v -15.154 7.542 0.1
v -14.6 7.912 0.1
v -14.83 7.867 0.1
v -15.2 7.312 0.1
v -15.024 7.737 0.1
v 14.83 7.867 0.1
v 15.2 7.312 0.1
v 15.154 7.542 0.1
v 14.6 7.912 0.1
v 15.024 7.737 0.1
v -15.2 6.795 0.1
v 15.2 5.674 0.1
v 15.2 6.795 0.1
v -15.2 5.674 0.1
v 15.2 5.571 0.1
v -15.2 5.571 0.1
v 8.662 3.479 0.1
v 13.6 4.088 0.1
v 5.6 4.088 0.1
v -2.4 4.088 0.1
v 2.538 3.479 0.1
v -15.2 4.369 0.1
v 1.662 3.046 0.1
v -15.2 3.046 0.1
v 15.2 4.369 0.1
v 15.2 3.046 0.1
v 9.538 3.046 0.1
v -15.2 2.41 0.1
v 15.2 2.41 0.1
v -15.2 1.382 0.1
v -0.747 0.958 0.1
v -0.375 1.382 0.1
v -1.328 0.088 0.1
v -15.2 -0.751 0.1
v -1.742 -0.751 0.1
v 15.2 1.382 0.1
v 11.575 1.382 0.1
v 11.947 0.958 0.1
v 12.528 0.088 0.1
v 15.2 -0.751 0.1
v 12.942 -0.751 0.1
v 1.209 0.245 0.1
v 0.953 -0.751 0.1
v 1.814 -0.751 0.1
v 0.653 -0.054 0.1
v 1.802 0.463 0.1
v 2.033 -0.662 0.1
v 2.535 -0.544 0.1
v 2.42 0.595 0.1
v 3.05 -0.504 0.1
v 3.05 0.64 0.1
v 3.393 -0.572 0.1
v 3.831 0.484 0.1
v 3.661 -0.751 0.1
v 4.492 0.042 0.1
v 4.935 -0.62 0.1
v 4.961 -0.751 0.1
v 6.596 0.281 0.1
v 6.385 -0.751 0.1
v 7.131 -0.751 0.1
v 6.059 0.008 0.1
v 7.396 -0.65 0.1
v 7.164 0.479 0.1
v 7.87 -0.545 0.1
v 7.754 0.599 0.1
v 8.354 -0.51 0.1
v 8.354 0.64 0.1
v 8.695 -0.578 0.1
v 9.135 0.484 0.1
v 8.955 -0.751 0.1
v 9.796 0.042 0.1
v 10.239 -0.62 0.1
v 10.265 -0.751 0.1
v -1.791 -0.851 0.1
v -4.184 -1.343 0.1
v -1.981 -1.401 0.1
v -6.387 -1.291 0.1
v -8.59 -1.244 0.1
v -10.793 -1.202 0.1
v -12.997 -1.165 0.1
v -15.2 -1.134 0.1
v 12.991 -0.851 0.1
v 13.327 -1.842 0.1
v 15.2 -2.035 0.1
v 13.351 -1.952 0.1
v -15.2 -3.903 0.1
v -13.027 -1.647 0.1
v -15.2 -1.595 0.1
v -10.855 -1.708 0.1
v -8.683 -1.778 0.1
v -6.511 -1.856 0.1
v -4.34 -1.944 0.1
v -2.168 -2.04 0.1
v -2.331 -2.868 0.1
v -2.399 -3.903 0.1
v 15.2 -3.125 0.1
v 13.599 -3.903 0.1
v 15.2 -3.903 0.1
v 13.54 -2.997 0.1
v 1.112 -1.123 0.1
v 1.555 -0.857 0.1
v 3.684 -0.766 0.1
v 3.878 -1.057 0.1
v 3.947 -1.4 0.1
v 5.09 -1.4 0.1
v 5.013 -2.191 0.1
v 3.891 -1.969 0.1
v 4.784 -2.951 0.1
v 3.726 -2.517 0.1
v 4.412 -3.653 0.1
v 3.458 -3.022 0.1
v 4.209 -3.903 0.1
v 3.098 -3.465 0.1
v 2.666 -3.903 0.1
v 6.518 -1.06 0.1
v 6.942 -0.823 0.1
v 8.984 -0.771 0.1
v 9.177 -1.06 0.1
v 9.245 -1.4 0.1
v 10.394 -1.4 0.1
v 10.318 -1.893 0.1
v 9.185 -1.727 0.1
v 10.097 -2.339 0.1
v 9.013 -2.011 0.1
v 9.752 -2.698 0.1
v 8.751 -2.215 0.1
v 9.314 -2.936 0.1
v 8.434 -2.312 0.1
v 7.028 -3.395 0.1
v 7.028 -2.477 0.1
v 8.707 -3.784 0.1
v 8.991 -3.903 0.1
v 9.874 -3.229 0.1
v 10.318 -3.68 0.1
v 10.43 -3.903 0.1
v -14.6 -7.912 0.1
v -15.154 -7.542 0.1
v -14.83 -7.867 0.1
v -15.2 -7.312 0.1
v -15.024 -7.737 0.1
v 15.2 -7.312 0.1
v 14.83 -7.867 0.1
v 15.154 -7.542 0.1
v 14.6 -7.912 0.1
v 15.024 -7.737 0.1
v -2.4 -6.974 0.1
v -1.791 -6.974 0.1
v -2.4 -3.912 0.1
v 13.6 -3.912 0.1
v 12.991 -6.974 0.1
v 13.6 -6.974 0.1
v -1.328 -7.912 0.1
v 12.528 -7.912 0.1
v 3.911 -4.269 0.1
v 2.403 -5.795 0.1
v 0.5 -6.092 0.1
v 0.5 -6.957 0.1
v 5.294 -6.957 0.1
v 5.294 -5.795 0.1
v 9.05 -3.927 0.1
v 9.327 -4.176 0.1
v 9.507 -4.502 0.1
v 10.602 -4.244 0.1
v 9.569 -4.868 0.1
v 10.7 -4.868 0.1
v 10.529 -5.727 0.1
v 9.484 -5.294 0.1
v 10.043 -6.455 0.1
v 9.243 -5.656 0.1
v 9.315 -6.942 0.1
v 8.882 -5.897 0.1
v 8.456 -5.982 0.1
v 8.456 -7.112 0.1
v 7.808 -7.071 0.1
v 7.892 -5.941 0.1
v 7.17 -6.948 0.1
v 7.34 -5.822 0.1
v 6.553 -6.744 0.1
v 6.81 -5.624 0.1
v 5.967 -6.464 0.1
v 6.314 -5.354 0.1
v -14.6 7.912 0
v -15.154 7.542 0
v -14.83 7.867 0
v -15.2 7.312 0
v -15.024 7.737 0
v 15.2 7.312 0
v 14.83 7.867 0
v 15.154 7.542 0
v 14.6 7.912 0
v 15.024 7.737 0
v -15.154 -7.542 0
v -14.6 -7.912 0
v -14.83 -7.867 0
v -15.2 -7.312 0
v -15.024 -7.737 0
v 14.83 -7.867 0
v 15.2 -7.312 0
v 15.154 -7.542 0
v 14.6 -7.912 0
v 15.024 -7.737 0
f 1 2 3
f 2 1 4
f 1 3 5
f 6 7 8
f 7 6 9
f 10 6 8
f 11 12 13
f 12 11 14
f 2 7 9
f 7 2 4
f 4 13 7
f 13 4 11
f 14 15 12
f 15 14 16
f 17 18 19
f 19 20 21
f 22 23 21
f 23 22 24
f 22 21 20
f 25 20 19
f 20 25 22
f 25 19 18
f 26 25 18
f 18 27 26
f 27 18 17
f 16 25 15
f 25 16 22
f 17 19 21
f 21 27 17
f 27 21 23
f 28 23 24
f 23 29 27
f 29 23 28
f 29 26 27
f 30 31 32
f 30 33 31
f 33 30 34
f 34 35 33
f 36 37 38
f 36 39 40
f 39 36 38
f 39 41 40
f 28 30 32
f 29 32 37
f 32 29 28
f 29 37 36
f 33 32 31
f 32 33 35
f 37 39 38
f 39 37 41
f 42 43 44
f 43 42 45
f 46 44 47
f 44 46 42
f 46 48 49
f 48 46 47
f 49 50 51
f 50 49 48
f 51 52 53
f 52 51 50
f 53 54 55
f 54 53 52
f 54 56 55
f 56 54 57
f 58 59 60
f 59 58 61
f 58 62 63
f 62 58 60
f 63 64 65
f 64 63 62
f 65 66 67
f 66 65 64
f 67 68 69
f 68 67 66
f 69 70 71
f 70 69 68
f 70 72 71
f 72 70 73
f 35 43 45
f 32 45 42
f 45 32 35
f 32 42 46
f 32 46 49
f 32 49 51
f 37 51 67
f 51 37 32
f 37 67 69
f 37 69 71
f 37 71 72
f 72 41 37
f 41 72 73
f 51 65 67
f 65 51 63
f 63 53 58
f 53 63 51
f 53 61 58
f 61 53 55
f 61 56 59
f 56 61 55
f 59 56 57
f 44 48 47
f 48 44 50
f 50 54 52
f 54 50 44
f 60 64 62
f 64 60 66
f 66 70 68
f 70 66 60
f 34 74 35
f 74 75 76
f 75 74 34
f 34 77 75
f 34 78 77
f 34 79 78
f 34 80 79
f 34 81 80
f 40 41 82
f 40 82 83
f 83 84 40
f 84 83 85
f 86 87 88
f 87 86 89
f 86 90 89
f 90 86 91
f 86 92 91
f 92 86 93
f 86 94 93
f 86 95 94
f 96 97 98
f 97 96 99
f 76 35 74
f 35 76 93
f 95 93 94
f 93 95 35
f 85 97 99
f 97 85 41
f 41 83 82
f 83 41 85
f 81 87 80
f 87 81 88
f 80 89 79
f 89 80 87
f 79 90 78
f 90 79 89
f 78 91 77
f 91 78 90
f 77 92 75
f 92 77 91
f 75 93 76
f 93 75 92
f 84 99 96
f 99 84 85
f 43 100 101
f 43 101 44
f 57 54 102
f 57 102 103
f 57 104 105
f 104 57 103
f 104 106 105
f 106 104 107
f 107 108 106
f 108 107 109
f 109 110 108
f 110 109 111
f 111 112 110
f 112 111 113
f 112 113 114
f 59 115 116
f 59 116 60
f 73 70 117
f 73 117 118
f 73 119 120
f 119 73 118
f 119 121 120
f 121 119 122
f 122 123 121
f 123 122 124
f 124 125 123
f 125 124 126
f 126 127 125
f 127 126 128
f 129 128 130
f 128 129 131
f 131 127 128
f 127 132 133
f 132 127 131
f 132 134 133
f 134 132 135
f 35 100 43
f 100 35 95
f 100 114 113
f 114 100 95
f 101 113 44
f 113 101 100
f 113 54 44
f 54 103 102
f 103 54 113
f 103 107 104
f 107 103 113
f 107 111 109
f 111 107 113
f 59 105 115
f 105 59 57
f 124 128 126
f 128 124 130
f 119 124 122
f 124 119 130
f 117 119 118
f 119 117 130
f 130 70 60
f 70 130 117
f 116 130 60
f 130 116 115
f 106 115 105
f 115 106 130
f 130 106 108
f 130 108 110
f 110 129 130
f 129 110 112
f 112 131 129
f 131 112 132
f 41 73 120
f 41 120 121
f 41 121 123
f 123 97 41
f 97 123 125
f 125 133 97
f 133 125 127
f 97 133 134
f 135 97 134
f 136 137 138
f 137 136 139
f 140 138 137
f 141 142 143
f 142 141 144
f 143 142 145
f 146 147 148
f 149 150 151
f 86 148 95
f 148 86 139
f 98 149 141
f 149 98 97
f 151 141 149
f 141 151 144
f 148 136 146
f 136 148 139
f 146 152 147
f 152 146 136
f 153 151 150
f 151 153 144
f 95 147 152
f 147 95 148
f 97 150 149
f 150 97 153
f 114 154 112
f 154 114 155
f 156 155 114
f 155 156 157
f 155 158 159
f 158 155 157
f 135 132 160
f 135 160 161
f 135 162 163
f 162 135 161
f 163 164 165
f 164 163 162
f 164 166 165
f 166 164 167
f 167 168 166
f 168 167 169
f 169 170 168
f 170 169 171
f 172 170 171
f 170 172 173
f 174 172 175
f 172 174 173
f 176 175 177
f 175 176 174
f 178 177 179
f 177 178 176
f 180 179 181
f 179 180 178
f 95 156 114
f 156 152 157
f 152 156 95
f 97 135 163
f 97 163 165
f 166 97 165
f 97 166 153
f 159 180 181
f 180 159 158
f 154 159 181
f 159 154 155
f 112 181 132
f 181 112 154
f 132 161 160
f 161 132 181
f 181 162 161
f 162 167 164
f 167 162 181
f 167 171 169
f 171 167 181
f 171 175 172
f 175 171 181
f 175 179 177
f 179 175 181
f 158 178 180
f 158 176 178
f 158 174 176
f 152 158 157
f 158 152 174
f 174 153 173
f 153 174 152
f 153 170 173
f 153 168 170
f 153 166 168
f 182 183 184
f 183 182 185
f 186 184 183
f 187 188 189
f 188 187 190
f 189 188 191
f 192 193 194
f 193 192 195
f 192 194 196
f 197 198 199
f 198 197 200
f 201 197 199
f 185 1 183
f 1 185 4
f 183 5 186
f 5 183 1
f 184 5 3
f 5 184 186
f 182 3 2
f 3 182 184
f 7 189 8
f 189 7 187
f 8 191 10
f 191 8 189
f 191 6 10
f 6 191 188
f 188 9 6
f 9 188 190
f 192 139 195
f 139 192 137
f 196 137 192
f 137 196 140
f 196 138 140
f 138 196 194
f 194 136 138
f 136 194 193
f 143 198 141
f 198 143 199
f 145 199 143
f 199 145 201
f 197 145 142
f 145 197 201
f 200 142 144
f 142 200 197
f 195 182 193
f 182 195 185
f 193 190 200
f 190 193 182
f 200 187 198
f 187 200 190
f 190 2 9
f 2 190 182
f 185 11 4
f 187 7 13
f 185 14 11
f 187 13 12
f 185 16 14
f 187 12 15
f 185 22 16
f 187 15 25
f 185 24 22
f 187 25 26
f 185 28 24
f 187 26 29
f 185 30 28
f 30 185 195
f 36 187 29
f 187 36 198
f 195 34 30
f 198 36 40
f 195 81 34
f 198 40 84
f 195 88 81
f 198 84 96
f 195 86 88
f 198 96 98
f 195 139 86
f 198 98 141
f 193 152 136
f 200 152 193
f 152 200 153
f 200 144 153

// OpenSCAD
use <../lib.scad>
use <s/6148328ws01.scad>
use <s/6148328ws02.scad>
use <s/6148328ws03.scad>
use <s/6148328ws04.scad>
use <s/6148328ws05.scad>
use <s/6148328ws06.scad>
function ldraw_lib__6148328w() = [
// 0 Sticker  2.0 x  3.8 with White Stripes and Black "23" in White Circle on Red Background Right
// 0 Name: 6148328w.dat
// 0 Author: Massimo Maso [Sirio]
// 0 !LDRAW_ORG Part UPDATE 2024-05
// 0 !LICENSE Licensed under CC BY 4.0 : see CAreadme.txt
// 
// 0 BFC CERTIFY CCW
  [0,"BFC","CERTIFY"],
  [0,"BFC","CCW"],
// 
// 0 !KEYWORDS 917K, Bricklink 75876stk01, Brickowl 852010, Pit Lane, Porsche
// 0 !KEYWORDS Rebrickable 26357, set 75876, Speed Champions
// 
// 0 !HISTORY 2024-06-30 [OrionP] Official Update 2024-05
// 
// 
// 0 // Subparts
// 
// 1 16 0 0 13.9773 1 0 0 0 1 0 0 0 1 s\6148328ws01.dat
  [1,16,0,0,13.9773,1,0,0,0,1,0,0,0,1, ldraw_lib__s__6148328ws01()],
// 1 16 0 0 13.8779 1 0 0 0 1 0 0 0 1 s\6148328ws02.dat
  [1,16,0,0,13.8779,1,0,0,0,1,0,0,0,1, ldraw_lib__s__6148328ws02()],
// 1 16 0 0 -1.8287 1 0 0 0 1 0 0 0 1 s\6148328ws03.dat
  [1,16,0,0,-1.8287,1,0,0,0,1,0,0,0,1, ldraw_lib__s__6148328ws03()],
// 1 16 0 0 -1.9281 1 0 0 0 1 0 0 0 1 s\6148328ws04.dat
  [1,16,0,0,-1.9281,1,0,0,0,1,0,0,0,1, ldraw_lib__s__6148328ws04()],
// 1 16 0 0 -9.7812 1 0 0 0 1 0 0 0 1 s\6148328ws05.dat
  [1,16,0,0,-9.7812,1,0,0,0,1,0,0,0,1, ldraw_lib__s__6148328ws05()],
// 1 16 0 0 0 1 0 0 0 1 0 0 0 1 s\6148328ws06.dat
  [1,16,0,0,0,1,0,0,0,1,0,0,0,1, ldraw_lib__s__6148328ws06()],
];
module ldraw_lib__6148328w(step=0, col=false, unit=2/5, alt=false, line=0.2, solid=!$preview)
    makepoly(ldraw_lib__6148328w(), step=step, col=col, unit=unit, alt=alt, line=line, solid=solid);
ldraw_lib__6148328w(line=0.2);
